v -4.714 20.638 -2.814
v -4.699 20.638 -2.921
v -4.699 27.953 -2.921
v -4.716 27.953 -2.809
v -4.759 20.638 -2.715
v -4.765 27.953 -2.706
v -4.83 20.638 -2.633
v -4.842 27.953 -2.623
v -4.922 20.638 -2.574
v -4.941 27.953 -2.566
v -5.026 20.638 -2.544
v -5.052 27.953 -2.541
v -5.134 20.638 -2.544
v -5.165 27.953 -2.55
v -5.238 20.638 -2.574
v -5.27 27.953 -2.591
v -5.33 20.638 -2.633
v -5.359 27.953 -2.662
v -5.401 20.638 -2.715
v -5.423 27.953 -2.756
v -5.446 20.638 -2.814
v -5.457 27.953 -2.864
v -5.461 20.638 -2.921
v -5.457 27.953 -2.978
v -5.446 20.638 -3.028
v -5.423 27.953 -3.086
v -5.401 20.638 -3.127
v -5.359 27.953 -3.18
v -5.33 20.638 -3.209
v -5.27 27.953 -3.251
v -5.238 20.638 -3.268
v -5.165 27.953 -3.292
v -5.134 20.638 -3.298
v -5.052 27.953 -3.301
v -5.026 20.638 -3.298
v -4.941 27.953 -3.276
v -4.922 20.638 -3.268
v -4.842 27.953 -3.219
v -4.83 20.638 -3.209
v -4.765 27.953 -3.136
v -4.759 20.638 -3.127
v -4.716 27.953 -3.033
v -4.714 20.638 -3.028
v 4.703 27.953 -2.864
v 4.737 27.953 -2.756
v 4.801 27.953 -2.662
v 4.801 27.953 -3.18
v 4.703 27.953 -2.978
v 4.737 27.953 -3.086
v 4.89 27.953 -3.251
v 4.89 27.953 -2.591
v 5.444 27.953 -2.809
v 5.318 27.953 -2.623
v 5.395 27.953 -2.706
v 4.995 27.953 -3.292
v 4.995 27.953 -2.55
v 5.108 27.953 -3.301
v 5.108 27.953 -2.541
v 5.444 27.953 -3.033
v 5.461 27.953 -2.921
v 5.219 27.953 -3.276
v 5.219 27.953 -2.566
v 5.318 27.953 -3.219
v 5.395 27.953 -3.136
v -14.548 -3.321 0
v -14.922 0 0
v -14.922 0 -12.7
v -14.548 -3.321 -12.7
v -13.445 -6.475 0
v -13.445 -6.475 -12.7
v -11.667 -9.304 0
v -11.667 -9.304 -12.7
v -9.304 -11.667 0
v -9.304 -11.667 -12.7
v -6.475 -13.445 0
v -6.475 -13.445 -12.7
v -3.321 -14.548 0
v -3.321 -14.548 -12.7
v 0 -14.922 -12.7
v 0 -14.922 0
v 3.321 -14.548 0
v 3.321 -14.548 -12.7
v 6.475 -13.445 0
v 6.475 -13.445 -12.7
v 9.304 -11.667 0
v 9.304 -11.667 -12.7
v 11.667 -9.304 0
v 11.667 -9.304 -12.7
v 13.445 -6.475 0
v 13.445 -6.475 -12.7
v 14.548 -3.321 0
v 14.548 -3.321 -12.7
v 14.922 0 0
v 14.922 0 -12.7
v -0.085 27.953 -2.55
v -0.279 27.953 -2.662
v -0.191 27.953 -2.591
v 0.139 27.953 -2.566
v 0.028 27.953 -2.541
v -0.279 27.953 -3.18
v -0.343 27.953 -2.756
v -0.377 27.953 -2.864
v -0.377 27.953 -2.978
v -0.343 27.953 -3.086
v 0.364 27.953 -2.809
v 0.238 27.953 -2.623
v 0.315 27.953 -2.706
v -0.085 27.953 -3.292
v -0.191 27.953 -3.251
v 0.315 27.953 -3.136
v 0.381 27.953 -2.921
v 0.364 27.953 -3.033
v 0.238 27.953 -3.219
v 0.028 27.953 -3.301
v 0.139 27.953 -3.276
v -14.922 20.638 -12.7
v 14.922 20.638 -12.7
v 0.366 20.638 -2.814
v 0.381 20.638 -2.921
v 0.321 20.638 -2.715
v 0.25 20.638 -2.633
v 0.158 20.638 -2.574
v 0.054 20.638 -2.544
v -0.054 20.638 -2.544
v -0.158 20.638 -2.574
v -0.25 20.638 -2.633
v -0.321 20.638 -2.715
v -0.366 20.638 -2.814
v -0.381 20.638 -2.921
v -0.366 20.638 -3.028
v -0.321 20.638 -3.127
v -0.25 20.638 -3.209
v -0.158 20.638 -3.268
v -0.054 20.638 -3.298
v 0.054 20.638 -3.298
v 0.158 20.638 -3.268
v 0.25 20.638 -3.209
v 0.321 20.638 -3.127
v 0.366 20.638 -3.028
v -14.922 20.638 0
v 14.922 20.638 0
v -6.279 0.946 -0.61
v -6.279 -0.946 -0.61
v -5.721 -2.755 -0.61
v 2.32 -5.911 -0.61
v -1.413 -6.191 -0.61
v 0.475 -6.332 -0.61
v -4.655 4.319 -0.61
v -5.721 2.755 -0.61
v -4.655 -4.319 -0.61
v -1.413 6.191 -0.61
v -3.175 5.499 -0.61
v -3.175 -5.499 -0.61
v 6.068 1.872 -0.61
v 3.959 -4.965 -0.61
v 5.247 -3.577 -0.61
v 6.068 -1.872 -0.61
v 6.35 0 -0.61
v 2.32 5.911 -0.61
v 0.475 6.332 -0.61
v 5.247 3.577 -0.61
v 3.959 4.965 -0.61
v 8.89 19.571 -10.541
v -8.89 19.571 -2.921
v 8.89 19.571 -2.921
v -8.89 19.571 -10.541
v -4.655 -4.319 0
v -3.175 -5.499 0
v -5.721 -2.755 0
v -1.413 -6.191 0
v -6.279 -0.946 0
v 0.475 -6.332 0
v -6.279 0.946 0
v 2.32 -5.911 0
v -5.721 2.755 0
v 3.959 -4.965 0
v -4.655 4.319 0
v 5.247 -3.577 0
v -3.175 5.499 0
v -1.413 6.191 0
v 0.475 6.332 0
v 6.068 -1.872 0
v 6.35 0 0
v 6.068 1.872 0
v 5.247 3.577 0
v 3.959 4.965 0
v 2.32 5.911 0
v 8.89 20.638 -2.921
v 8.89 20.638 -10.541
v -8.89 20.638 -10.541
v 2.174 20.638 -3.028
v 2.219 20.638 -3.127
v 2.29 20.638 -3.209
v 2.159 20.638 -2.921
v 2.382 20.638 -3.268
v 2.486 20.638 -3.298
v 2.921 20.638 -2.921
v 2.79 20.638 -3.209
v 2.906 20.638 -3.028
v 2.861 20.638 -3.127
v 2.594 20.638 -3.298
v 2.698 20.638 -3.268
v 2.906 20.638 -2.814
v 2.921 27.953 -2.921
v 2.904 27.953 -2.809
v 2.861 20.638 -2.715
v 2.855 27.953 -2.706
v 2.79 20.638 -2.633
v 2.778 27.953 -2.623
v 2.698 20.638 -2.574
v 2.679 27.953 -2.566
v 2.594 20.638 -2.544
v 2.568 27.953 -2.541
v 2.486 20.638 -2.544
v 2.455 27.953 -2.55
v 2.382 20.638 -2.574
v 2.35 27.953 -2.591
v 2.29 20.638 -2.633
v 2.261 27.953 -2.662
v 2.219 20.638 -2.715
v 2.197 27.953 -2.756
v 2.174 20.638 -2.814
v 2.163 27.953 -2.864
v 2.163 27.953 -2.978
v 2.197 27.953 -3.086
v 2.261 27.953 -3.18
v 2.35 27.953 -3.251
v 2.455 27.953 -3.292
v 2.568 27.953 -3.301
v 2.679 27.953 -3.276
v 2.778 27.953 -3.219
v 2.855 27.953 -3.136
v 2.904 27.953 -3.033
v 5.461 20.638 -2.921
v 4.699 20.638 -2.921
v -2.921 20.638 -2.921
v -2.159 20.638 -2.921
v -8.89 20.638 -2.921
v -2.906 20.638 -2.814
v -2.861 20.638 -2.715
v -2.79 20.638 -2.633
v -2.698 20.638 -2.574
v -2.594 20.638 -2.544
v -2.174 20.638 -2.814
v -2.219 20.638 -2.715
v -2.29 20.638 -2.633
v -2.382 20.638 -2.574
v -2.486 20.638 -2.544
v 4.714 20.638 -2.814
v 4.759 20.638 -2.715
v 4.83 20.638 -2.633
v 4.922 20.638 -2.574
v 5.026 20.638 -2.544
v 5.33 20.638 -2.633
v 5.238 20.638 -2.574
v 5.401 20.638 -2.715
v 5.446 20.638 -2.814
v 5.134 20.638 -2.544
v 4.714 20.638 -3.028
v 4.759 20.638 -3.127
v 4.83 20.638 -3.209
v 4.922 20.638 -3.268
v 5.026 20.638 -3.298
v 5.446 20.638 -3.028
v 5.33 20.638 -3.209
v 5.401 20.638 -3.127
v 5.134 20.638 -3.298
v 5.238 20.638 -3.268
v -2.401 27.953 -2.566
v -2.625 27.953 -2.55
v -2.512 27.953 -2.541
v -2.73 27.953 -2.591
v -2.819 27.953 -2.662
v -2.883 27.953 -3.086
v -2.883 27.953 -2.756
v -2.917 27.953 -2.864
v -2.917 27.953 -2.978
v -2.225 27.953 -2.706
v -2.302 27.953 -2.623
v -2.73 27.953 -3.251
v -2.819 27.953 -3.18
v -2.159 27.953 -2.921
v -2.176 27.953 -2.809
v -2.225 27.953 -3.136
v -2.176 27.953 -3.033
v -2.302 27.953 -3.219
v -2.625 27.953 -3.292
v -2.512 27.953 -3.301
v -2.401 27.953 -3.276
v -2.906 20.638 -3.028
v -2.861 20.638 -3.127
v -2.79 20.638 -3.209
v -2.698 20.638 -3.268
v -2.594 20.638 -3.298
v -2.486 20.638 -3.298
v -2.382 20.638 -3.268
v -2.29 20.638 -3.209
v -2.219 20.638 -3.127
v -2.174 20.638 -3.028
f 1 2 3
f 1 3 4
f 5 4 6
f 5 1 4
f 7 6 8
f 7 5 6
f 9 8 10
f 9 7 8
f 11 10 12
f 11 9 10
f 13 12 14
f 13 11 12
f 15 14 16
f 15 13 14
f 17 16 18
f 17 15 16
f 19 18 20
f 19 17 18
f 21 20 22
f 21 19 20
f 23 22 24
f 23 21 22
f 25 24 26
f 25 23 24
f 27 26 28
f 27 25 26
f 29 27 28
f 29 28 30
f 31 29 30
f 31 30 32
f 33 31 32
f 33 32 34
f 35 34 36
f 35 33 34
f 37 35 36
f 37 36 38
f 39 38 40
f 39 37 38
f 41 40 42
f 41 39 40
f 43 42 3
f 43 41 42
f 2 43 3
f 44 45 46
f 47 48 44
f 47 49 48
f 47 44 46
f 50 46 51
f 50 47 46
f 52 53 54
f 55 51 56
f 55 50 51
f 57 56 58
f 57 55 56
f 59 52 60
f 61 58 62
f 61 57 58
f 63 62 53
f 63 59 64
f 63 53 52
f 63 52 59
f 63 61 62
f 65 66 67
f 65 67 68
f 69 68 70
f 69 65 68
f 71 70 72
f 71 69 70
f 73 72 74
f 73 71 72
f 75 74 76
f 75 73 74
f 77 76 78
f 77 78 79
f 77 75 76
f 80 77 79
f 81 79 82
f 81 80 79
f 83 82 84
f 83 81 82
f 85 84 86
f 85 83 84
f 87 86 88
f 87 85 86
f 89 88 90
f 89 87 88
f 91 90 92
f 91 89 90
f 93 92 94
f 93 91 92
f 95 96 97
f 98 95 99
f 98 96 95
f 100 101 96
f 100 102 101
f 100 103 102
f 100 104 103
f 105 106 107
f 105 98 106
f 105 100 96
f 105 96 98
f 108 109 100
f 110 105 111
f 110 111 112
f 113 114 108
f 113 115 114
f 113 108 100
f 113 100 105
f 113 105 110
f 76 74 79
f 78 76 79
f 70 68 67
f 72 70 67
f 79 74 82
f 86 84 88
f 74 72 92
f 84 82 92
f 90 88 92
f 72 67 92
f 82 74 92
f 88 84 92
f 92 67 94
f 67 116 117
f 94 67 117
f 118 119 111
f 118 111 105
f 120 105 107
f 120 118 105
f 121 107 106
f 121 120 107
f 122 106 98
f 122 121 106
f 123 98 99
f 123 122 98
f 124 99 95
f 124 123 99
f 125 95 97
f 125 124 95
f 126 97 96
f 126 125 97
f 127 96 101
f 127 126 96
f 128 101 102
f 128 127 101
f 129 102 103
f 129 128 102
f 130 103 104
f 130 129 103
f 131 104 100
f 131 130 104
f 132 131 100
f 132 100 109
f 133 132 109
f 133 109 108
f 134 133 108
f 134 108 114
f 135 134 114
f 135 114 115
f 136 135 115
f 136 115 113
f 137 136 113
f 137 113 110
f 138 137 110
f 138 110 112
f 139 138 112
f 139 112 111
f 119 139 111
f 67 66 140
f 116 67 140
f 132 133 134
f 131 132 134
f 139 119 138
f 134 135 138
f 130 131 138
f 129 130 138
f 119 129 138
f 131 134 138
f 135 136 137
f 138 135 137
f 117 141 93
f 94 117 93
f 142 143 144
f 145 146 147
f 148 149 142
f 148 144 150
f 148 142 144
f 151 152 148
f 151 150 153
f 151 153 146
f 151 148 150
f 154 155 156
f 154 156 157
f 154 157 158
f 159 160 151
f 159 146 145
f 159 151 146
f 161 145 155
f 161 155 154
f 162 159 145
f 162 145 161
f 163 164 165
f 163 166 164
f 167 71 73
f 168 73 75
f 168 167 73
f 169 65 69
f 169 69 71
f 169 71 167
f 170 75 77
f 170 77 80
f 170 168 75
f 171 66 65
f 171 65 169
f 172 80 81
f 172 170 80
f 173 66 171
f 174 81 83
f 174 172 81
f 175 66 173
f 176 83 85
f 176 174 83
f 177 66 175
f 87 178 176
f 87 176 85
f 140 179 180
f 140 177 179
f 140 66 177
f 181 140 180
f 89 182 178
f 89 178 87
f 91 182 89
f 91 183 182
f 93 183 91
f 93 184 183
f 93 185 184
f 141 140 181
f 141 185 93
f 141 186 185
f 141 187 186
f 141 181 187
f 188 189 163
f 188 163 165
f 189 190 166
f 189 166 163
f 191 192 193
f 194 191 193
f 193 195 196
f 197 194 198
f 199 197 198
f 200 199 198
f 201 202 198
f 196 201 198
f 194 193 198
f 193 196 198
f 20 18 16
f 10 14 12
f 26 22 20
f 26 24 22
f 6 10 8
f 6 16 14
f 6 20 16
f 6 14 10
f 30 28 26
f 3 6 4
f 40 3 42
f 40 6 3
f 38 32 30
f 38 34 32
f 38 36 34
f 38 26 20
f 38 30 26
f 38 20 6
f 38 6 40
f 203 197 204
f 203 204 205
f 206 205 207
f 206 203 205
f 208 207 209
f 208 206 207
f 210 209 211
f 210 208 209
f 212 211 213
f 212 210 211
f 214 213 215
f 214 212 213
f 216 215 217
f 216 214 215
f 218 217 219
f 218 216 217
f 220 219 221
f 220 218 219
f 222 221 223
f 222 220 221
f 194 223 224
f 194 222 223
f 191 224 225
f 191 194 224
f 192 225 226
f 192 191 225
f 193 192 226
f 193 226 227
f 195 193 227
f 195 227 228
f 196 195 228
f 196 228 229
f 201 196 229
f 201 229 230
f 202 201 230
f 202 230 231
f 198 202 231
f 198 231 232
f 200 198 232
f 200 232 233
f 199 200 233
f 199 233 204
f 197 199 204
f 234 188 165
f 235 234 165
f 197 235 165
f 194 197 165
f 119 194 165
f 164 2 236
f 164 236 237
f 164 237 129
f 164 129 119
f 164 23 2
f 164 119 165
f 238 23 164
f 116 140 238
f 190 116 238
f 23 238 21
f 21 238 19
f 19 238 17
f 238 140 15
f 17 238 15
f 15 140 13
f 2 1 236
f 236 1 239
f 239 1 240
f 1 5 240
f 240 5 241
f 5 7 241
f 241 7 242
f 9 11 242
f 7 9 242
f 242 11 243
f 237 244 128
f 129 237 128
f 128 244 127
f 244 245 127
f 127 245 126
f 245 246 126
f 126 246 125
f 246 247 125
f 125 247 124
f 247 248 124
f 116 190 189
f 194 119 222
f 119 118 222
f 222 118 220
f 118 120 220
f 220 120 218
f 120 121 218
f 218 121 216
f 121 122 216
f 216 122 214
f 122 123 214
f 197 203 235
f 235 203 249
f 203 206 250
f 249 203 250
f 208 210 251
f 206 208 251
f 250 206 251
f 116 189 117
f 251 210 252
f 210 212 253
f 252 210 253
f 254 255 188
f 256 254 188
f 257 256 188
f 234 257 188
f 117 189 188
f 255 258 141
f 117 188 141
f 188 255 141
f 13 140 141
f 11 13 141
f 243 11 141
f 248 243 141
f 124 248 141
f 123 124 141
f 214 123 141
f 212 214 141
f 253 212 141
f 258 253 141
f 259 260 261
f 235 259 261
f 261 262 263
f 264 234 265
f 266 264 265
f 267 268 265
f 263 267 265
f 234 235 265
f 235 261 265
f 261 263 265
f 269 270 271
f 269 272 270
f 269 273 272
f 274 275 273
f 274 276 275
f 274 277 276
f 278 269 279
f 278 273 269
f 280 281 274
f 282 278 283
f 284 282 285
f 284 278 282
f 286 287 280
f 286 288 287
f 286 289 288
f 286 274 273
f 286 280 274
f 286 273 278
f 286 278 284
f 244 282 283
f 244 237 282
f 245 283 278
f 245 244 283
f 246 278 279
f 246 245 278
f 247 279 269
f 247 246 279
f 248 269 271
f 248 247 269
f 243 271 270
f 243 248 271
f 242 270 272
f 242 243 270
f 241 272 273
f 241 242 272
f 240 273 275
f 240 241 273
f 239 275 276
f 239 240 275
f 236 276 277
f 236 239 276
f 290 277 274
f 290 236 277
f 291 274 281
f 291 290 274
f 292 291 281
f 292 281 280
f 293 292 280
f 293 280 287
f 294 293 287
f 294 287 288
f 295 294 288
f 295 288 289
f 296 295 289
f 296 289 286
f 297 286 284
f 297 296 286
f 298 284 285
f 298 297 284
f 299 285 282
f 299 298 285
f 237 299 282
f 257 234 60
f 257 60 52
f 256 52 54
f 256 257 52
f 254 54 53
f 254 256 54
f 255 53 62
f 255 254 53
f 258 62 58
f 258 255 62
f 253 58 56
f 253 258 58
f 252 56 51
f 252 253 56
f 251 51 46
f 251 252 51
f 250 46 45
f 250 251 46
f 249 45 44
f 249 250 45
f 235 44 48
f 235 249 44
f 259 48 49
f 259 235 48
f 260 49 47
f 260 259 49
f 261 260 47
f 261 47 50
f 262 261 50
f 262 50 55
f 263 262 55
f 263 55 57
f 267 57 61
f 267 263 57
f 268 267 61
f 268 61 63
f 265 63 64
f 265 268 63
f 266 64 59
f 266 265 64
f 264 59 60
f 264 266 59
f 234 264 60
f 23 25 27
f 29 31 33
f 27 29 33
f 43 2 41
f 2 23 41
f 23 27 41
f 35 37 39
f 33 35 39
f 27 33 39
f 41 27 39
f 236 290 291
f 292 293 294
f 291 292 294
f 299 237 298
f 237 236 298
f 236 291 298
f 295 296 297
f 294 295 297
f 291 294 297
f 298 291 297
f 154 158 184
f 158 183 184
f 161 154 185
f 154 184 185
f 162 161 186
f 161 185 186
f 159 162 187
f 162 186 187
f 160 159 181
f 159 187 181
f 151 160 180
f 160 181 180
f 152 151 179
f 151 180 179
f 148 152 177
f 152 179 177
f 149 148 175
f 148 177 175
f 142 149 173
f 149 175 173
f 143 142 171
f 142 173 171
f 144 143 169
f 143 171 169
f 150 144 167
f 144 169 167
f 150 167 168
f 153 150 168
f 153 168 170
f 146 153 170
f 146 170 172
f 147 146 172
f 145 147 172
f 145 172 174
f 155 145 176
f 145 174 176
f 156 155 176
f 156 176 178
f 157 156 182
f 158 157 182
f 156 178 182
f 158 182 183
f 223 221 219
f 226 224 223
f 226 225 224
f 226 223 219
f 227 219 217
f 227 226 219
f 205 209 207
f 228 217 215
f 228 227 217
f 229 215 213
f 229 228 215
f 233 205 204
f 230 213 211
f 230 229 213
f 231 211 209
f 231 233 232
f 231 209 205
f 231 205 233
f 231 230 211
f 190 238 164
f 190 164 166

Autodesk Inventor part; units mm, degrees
ref_plane "YZ Plane" through (0, 0, 0) normal (1, 0, 0) x (0, 1, 0)
ref_plane "XZ Plane" through (0, 0, 0) normal (0, 1, 0) x (-1, 0, 0)
ref_plane "XY Plane" through (0, 0, 0) normal (0, 0, 1) x (1, 0, 0)
sketch "Sketch1" plane through (0, 0, 0) normal (0, 0, 1) x (1, 0, 0)
  arc A0 (-14.9225, 0) -> (14.9225, 0) centre (0, 0) ccw
  line L0 (-14.9225, 0) -> (-14.9225, 20.6375)
  line L1 (-14.9225, 20.6375) -> (14.9225, 20.6375)
  line L2 (14.9225, 20.6375) -> (14.9225, 0)
  circle A1 centre (0, 0) radius 4.6736
  circle A2 centre (0, 0) radius 3.175
  line L3 (14.9225, 0) -> (14.9225, -0.9265)
  circle A3 centre (0, 0) radius 6.35
  dimension "d0" = 29.845
  dimension "d2" = 9.3472
  dimension "d3" = 6.35
  dimension "d6" = 12.7
  dimension "d24" = 35.56
extrude "Extrusion2" add sketch "Sketch1" against normal blind 12.7 contours L0 L1 L2 A0 | A1 | A2 | A3
extrude "Extrusion3" cut sketch "Sketch1" against normal blind 0.6096 contours A1 | A2 | A3
sketch "Sketch2" plane through (-14.9225, 20.6375, 0) normal (0, 1, 0) x (1, 0, 0)
  line L0 (0, 0) -> (0, 12.7) projected
  line L1 (29.845, 0) -> (0, 0) projected
  line L2 (29.845, 0) -> (29.845, 12.7) projected
  line L3 (6.0325, 10.541) -> (23.8125, 10.541)
  line L4 (23.8125, 10.541) -> (23.8125, 2.921)
  line L5 (23.8125, 2.921) -> (6.0325, 2.921)
  line L6 (6.0325, 2.921) -> (6.0325, 10.541)
  circle A0 centre (9.8425, 2.921) radius 0.381
  circle A1 centre (12.3825, 2.921) radius 0.381
  circle A2 centre (14.9225, 2.921) radius 0.381
  circle A3 centre (17.4625, 2.921) radius 0.381
  circle A4 centre (20.0025, 2.921) radius 0.381
  point P0 (14.9225, 0)
  dimension "d11" = 17.78
  dimension "d12" = 8.89
  dimension "d13" = 7.62
  dimension "d14" = 2.921
  dimension "d15" = 0.762
  dimension "d16" = 9.8425
  dimension "d19" = 2.54
  dimension "d25" = 9.8425
extrude "Extrusion4" cut sketch "Sketch2" against normal blind 1.0668 contours L3 L4 L5 A4 A3 A2 A1 A0 L6 | A0 L5 | L5 A4 | A1 L5 | L5 A3 | A2 L5 picked at (9.9376, 3.0052) picked at (19.9292, 3.1544) picked at (12.4776, 3.0052) picked at (17.3892, 3.1544) picked at (15.0176, 3.0052)
extrude "Extrusion5" add sketch "Sketch2" along normal blind 7.3152 contours A0 L5 | L5 A0 | A4 L5 | L5 A4 | A1 L5 | L5 A1 | A3 L5 | L5 A3 | A2 L5 | L5 A2
equation "\"d12\" = 0.5 * d11"
properties part number "USD S1-100-B Housing"
